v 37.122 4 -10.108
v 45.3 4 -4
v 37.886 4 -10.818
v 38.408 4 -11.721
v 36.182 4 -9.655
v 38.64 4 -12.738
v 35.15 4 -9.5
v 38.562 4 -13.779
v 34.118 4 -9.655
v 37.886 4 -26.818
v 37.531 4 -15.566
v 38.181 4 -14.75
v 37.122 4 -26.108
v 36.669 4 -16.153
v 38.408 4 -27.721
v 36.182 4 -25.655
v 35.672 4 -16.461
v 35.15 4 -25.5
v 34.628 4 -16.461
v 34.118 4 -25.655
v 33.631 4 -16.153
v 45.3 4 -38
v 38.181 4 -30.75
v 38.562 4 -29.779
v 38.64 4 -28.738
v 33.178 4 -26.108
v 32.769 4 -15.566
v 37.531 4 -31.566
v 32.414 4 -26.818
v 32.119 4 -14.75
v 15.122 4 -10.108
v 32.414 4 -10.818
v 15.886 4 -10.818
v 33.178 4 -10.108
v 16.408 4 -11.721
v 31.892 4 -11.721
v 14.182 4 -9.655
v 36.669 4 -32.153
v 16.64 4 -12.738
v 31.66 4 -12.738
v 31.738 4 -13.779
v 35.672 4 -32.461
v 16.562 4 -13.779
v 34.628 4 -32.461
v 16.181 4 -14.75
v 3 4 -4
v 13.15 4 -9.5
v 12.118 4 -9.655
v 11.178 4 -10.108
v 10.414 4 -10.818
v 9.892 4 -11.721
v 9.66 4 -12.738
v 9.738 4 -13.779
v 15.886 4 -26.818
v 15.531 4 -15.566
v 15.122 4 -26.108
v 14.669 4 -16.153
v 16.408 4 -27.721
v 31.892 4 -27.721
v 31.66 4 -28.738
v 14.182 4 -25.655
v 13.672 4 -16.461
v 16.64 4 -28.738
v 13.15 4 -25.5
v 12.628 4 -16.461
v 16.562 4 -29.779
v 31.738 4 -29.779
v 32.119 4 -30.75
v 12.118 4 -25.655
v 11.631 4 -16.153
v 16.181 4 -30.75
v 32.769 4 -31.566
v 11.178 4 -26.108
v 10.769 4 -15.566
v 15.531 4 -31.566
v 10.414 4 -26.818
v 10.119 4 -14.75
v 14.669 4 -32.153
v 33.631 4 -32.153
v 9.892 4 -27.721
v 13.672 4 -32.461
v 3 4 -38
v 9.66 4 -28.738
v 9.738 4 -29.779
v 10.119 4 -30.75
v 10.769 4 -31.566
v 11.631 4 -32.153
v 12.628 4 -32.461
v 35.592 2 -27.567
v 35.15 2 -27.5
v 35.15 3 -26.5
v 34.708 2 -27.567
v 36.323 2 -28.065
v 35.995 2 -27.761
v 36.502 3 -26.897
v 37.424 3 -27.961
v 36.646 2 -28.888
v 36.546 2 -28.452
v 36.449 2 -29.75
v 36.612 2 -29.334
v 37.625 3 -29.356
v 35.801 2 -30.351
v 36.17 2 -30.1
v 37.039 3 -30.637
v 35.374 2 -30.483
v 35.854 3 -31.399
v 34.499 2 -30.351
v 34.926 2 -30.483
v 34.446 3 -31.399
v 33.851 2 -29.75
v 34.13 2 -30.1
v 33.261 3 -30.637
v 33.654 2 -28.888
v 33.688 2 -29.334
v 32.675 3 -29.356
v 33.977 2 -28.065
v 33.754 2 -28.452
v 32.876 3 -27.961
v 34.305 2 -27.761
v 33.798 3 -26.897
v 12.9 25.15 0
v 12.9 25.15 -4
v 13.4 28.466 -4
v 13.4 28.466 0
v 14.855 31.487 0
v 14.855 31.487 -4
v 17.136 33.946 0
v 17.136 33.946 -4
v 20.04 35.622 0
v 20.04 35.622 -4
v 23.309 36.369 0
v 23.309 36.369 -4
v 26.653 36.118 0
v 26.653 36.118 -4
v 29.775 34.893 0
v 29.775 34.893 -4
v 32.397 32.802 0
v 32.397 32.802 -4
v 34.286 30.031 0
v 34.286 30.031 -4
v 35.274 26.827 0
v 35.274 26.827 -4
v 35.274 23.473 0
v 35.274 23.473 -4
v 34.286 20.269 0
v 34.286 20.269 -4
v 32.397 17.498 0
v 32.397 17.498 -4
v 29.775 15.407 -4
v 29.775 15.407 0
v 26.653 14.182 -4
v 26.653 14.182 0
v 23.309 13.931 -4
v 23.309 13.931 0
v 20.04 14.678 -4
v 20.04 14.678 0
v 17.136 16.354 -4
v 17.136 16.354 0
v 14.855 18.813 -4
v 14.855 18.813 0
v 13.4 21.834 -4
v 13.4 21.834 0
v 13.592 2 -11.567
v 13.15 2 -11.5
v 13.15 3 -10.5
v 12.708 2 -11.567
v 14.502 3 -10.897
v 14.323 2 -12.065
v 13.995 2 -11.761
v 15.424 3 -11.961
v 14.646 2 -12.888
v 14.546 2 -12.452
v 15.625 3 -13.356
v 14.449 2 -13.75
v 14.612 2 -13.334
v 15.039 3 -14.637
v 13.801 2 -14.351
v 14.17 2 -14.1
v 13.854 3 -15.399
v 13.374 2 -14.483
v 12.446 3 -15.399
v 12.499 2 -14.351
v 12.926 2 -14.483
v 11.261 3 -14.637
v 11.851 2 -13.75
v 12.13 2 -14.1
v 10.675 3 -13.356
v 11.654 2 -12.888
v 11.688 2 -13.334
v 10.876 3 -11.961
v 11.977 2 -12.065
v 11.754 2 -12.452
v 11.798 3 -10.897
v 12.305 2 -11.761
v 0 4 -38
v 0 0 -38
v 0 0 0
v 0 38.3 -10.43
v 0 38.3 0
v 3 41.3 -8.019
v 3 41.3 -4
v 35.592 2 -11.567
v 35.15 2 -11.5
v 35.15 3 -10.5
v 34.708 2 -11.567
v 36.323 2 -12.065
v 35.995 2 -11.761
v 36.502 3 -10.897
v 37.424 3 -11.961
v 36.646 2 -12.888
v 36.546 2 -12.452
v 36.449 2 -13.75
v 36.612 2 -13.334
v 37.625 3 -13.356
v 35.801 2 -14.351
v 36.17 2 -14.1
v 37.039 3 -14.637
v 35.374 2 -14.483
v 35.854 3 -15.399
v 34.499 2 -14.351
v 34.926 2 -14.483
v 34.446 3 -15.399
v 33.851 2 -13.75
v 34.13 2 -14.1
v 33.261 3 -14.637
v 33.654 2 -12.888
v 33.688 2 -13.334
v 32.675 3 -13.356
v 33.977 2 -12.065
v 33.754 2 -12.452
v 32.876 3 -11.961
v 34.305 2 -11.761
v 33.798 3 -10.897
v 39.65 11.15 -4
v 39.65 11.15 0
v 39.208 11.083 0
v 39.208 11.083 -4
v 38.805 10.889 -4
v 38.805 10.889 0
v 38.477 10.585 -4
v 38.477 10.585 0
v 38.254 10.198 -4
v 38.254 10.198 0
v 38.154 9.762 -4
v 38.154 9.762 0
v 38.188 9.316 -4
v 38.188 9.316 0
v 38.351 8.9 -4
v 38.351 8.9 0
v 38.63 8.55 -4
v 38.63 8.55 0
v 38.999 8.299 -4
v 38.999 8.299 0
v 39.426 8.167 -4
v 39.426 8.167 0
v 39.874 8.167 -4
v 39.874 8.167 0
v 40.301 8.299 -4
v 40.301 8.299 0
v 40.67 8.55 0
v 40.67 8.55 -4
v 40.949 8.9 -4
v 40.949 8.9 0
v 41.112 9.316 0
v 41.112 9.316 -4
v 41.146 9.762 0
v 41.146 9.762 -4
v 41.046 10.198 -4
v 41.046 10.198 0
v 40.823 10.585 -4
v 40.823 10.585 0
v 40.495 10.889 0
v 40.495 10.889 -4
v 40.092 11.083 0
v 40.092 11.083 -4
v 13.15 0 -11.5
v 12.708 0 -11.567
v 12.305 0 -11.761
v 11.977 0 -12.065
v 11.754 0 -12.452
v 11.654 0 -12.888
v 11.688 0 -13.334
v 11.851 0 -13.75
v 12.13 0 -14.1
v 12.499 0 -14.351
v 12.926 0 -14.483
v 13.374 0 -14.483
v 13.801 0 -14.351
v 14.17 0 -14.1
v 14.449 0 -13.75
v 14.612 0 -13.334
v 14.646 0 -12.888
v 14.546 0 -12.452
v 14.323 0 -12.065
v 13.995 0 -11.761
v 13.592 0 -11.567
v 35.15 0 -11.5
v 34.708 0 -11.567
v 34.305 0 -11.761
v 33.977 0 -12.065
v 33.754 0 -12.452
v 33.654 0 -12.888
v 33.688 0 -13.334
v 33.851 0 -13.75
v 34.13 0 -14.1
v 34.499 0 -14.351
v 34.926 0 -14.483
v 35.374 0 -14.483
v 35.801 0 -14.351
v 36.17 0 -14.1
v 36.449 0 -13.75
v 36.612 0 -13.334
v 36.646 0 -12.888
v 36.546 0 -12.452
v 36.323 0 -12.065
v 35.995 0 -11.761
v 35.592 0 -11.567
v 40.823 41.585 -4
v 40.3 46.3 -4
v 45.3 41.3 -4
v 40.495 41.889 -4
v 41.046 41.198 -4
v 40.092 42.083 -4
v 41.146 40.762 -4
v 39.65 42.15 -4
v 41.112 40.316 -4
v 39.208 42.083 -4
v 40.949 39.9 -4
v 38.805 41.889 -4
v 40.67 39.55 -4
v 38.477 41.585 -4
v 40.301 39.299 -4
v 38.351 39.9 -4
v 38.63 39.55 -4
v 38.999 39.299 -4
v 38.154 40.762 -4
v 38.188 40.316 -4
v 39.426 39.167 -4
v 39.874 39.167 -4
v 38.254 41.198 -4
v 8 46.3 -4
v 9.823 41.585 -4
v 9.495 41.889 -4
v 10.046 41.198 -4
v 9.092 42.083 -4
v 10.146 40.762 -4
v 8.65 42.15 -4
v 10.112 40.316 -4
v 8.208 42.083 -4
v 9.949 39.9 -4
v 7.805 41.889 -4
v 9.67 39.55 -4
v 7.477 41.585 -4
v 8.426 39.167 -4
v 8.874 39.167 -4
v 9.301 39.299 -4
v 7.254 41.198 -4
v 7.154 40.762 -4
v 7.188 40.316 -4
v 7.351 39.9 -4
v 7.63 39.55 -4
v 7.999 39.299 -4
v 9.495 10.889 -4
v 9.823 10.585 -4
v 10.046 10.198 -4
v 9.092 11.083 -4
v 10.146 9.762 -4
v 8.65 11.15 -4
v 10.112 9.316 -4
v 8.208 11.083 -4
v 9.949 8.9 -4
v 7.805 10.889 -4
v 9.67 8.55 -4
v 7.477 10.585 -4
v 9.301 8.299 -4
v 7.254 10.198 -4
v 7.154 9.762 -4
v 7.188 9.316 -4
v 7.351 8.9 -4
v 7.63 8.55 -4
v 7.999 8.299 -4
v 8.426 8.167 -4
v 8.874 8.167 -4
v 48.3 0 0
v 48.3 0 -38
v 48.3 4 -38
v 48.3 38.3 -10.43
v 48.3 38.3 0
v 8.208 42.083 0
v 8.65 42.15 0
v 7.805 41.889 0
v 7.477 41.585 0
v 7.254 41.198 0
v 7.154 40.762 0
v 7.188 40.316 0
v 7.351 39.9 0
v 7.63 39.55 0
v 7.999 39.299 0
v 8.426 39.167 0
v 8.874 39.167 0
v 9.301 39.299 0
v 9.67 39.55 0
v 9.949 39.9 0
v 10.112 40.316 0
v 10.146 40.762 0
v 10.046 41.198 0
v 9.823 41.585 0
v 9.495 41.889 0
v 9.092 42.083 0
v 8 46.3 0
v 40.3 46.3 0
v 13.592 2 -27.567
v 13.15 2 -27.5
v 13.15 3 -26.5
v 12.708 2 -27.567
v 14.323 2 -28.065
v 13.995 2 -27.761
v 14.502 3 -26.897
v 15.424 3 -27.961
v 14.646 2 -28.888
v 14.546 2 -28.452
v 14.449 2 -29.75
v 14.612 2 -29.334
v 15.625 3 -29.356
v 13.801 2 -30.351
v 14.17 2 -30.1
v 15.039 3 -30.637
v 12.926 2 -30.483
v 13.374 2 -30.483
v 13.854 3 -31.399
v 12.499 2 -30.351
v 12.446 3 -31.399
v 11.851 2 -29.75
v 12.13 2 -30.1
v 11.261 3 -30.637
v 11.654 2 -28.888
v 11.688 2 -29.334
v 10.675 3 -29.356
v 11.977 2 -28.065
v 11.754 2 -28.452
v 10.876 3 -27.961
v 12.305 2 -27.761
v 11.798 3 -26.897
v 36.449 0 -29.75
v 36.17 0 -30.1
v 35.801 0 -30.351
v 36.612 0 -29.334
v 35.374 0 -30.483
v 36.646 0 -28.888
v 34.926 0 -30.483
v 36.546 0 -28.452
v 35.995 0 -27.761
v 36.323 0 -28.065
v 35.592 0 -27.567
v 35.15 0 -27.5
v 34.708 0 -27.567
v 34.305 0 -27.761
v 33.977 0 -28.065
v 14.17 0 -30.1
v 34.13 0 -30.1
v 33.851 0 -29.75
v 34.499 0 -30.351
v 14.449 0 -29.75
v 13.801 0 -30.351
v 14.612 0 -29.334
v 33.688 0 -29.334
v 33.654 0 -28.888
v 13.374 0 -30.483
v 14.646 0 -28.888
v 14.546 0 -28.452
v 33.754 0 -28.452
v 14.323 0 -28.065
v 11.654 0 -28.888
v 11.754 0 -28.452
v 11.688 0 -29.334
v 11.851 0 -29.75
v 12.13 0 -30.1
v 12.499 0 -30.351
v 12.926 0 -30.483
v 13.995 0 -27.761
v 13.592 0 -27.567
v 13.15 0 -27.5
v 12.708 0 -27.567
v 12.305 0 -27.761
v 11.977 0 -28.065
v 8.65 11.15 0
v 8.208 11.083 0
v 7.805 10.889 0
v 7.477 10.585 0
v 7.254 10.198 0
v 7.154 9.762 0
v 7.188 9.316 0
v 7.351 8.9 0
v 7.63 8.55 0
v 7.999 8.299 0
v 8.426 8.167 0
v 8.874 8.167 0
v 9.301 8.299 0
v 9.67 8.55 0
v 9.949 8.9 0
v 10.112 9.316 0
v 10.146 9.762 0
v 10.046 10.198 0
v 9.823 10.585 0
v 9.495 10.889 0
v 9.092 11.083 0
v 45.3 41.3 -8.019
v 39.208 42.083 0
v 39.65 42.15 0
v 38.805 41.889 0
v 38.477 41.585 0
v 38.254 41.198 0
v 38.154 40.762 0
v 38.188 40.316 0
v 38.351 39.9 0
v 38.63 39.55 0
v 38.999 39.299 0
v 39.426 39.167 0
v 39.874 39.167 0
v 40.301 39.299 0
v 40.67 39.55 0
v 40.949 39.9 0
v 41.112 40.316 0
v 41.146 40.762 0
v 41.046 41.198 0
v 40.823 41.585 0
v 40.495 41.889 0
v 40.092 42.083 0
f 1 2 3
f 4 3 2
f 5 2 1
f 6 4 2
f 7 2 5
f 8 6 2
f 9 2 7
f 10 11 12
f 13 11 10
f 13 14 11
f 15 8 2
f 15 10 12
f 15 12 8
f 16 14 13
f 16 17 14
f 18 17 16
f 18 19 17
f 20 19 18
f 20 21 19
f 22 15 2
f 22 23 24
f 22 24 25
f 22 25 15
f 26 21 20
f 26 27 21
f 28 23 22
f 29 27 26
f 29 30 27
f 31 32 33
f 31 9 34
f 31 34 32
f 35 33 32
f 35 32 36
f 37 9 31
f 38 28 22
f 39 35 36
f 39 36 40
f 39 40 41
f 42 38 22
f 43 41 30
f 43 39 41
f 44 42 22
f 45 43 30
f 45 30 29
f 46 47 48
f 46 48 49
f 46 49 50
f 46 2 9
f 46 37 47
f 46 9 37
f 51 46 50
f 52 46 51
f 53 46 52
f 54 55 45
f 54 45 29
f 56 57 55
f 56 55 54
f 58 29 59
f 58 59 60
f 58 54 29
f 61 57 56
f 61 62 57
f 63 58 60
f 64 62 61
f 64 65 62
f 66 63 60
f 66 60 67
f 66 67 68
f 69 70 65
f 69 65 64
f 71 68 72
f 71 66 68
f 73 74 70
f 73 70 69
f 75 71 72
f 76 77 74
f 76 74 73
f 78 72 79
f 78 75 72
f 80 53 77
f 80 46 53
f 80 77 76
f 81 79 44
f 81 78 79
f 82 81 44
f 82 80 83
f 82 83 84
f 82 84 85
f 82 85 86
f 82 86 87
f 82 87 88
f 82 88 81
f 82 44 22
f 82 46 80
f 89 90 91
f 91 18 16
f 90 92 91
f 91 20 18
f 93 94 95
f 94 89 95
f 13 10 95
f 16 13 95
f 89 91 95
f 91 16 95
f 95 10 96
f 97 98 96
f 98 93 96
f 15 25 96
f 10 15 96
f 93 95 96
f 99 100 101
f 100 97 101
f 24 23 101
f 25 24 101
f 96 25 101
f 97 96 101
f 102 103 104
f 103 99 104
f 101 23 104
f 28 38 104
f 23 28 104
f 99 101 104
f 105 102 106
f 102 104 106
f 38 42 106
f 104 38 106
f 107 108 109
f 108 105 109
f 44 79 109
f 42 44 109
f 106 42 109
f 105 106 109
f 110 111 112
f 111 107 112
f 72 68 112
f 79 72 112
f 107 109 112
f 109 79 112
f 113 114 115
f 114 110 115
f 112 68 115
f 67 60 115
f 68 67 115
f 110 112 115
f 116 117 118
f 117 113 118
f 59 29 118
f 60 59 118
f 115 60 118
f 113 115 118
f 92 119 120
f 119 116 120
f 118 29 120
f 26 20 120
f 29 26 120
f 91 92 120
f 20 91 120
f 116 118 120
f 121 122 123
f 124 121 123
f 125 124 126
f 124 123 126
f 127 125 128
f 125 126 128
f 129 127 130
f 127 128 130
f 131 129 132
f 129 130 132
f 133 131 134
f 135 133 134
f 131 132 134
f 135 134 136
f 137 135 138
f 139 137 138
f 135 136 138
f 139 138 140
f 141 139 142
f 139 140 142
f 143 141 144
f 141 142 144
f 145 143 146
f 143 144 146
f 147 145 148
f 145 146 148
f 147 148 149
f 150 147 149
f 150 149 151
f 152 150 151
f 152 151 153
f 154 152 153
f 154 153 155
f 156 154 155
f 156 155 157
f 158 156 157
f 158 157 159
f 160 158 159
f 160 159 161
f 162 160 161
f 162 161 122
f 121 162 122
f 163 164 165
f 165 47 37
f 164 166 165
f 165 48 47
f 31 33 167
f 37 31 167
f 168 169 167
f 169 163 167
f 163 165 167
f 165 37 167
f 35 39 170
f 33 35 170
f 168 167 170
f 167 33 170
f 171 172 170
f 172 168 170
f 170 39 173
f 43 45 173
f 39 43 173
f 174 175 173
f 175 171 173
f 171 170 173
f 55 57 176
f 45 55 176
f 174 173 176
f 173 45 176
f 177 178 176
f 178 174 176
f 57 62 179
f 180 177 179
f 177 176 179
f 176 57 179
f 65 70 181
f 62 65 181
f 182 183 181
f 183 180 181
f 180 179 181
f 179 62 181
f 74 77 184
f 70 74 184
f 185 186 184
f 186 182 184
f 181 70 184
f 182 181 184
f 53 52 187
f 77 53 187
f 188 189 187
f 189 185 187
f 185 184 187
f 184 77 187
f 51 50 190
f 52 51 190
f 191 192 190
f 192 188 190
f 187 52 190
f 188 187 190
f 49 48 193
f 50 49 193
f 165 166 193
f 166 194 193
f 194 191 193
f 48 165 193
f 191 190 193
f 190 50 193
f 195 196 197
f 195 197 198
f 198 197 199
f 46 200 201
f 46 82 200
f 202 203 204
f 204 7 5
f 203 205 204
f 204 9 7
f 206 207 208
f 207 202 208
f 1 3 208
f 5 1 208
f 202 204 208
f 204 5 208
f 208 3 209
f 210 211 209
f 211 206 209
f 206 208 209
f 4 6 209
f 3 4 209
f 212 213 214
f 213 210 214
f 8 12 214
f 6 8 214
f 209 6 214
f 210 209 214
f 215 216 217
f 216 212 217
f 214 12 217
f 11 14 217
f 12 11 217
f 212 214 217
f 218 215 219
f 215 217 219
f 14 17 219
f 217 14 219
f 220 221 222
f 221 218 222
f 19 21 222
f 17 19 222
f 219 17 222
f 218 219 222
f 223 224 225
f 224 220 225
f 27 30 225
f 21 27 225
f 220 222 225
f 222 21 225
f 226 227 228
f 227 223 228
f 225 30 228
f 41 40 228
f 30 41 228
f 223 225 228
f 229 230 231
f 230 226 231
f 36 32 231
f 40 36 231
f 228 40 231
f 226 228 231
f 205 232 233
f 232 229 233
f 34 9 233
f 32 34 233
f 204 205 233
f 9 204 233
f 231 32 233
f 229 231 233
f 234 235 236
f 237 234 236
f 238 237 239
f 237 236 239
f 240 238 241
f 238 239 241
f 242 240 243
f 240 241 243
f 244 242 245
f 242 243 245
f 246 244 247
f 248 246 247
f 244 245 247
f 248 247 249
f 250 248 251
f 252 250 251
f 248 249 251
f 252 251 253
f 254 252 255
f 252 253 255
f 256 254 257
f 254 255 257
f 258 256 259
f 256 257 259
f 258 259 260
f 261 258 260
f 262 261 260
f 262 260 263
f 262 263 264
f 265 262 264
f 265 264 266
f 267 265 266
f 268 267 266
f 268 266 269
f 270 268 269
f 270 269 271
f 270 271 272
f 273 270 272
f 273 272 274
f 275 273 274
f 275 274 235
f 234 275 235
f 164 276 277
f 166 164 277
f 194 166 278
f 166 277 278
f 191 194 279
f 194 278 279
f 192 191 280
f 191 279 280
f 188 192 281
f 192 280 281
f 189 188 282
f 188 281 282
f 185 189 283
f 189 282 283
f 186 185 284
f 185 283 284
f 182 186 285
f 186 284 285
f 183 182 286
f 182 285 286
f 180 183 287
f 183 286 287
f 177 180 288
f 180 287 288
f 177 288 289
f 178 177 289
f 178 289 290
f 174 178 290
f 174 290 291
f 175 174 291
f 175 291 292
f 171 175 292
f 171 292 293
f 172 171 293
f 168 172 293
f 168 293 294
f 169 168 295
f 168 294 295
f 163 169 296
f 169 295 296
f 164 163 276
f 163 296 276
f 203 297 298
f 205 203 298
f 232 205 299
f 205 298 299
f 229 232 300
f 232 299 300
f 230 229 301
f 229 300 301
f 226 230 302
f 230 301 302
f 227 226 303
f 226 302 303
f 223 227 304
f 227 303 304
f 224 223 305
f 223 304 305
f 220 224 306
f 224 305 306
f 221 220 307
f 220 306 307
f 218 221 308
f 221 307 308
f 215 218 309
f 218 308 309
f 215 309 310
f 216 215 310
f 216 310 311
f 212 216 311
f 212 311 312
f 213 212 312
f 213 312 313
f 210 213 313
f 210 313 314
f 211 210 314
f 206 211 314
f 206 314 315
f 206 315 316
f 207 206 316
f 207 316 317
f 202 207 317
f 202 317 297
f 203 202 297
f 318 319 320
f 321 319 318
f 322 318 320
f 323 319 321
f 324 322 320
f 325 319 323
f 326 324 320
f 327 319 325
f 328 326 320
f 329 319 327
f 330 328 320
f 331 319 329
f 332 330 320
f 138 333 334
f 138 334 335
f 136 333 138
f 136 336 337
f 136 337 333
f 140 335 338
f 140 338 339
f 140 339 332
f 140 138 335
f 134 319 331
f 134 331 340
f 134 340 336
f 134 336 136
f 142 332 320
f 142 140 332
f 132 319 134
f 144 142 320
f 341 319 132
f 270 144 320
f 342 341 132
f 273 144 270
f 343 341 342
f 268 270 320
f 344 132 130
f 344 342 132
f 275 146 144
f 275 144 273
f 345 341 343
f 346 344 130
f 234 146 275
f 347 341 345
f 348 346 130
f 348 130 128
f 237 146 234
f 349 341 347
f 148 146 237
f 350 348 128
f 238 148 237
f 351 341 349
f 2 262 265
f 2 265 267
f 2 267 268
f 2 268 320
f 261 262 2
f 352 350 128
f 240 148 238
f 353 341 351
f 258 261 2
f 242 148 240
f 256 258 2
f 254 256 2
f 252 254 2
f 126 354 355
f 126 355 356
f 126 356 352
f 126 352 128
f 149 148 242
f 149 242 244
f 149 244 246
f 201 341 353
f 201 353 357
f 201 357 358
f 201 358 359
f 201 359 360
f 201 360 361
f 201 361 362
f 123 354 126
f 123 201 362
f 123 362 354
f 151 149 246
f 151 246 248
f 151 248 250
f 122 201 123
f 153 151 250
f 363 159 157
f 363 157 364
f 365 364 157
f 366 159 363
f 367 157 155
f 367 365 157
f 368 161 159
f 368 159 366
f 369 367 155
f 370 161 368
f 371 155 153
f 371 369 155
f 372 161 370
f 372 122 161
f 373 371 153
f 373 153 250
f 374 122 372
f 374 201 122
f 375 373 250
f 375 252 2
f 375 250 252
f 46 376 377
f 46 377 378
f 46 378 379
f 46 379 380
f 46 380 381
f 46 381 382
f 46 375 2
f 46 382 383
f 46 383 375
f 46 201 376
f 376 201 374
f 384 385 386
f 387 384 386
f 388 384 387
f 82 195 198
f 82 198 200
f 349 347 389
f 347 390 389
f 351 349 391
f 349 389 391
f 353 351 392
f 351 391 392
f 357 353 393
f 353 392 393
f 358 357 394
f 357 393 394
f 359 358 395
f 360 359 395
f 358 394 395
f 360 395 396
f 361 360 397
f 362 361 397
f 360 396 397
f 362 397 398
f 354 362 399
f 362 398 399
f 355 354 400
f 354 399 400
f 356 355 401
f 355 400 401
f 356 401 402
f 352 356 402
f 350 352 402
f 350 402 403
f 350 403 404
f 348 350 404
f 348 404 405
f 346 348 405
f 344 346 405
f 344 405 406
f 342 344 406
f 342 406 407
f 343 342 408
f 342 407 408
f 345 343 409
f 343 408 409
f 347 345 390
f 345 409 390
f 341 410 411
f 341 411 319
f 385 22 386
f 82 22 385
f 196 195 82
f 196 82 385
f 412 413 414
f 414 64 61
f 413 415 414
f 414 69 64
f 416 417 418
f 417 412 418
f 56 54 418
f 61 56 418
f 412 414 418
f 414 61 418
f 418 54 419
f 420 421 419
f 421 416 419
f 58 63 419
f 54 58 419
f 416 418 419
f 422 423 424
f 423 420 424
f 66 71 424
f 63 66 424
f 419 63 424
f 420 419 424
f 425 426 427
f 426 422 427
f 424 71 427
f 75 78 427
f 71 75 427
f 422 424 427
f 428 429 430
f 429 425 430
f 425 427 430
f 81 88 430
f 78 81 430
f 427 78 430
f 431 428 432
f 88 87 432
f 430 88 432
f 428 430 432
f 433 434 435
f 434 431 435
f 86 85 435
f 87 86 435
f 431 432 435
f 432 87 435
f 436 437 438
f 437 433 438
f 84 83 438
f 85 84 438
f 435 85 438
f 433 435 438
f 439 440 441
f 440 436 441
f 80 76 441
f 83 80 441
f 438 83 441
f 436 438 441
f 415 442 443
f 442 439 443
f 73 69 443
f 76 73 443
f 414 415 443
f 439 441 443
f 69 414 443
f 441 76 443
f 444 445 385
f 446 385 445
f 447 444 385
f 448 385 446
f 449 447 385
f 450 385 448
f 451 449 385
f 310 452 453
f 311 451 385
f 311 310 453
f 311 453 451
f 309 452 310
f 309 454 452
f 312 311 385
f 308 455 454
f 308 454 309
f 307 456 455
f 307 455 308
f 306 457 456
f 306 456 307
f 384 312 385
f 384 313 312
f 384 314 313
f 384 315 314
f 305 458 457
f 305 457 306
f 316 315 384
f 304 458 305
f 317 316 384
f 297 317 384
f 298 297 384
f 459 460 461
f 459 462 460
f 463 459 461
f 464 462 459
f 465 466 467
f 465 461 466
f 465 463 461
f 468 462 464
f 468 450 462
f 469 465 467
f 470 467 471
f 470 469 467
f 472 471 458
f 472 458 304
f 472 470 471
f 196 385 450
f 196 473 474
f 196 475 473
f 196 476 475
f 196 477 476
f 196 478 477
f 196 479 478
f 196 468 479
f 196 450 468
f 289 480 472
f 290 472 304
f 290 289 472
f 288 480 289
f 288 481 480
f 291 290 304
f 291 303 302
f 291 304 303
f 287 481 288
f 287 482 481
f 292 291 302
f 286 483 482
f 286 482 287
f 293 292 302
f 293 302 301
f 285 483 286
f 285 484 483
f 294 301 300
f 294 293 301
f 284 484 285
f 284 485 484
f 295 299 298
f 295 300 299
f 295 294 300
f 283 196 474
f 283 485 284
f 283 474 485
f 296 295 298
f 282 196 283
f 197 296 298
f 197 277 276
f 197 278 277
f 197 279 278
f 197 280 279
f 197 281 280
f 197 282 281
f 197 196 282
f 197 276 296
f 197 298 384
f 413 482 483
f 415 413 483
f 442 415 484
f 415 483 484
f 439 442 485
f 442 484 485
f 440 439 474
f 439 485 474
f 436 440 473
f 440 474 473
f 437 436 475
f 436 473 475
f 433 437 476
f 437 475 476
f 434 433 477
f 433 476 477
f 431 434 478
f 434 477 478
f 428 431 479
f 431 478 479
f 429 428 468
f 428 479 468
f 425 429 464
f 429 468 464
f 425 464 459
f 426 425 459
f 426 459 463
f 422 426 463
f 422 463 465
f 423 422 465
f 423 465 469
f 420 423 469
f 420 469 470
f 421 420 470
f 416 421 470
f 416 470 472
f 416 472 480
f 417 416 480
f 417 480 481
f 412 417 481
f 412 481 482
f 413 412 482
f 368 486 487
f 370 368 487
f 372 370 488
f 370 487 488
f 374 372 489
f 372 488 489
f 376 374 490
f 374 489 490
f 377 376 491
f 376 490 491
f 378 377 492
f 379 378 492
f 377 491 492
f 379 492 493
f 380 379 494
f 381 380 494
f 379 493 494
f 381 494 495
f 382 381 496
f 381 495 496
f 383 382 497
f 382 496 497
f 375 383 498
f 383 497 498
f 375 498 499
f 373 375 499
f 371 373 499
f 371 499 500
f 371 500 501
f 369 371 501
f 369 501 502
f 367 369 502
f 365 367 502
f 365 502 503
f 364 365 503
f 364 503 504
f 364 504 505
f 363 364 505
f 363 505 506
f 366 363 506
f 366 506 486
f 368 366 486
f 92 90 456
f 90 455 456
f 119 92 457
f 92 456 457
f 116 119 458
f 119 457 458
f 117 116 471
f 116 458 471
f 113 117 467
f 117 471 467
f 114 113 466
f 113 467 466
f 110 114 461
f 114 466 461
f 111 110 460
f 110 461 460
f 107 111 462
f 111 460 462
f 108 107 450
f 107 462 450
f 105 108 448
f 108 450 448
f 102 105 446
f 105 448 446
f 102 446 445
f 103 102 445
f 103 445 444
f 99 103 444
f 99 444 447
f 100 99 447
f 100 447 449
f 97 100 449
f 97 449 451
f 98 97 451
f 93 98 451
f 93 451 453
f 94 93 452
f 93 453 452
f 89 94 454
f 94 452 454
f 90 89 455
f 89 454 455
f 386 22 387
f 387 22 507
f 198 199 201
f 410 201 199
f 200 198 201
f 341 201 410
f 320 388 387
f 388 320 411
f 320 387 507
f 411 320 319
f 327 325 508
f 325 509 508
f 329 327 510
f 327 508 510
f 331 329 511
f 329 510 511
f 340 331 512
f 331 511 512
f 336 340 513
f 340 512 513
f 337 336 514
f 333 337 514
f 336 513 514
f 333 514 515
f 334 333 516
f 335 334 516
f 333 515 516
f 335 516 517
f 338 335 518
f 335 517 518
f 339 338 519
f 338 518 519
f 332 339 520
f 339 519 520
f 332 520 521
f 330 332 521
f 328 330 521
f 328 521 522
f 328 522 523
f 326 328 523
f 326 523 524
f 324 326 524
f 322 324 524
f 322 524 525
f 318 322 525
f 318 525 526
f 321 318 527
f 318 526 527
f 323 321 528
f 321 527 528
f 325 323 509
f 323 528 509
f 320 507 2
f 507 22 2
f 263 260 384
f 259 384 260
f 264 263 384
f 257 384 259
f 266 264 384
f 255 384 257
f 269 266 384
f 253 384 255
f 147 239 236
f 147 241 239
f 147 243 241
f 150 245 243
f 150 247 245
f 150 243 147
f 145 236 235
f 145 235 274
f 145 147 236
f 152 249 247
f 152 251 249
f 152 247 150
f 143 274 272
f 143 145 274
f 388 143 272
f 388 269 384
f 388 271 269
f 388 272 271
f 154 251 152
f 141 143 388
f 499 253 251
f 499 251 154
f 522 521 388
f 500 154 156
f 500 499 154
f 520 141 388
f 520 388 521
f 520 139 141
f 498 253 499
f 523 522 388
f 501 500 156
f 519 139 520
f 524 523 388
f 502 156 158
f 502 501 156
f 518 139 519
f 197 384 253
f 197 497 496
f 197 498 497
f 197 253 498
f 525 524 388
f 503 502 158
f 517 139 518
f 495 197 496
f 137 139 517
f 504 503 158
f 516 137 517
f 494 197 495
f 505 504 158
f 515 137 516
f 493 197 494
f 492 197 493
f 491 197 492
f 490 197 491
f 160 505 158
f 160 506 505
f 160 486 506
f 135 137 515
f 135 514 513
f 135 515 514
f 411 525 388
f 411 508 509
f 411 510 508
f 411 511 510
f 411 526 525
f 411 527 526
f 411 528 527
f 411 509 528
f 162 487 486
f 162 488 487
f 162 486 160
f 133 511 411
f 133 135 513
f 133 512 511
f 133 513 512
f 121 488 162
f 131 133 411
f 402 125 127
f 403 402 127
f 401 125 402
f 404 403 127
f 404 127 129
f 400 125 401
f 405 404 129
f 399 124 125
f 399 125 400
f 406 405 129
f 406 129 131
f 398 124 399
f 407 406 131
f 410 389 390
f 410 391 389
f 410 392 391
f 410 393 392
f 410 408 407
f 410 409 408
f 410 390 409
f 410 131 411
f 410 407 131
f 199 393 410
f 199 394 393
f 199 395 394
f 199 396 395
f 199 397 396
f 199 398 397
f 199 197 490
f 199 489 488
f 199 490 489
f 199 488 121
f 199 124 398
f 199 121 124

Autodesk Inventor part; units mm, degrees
ref_plane "YZ Plane" through (0, 0, 0) normal (1, 0, 0) x (0, 1, 0)
ref_plane "XZ Plane" through (0, 0, 0) normal (0, 1, 0) x (-1, 0, 0)
ref_plane "XY Plane" through (0, 0, 0) normal (0, 0, 1) x (1, 0, 0)
sketch "Szkic5" plane through (0, 0, 0) normal (1, 0, 0) x (0, 1, 0)
  line L0 (0, 0) -> (4, 0)
  line L1 (4, 0) -> (4, -38)
  line L2 (4, -38) -> (0, -38)
  line L3 (0, -38) -> (0, 0)
  line L4 (4, 0) -> (46.3, 0)
  line L5 (46.3, 0) -> (46.3, -4)
  line L6 (46.3, -4) -> (4, -4)
  line L7 (4, -4) -> (4, 0)
  dimension "d10" = 4
  dimension "d11" = 38
  dimension "d12" = 42.3
  dimension "d13" = 4
extrude "Wyciągnięcie proste2" add sketch "Szkic5" along normal blind 48.3
sketch "Szkic6" plane through (0, 4, -4) normal (0, 1, 0) x (1, 0, 0)
  line L0 (48.3, -4) -> (48.3, 34) projected
  line L1 (48.3, 34) -> (45.3, 34)
  line L2 (45.3, 34) -> (45.3, 0)
  line L3 (45.3, 0) -> (48.3, 0)
  line L4 (48.3, 0) -> (48.3, 34)
  line L5 (0, -4) -> (0, 34) projected
  line L6 (0, 34) -> (3, 34)
  line L7 (3, 34) -> (3, 0)
  line L8 (3, 0) -> (0, 0)
  line L9 (0, 0) -> (0, 34)
  dimension "d16" = 3
  dimension "d17" = 34
  dimension "d18" = 3
  dimension "d19" = 34
extrude "Wyciągnięcie proste3" add sketch "Szkic6" along normal blind 42.3
sketch "Szkic7" plane through (0, 0, 0) normal (-1, 0, 0) x (0, 0, 1)
  line L0 (-4, 46.3) -> (-38, 46.3) projected
  line L1 (-4, 46.3) -> (-38, 46.3)
  line L2 (-38, 4) -> (-38, 46.3) projected
  line L3 (-38, 46.3) -> (-38, 4)
  line L4 (-38, 4) -> (-4, 46.3)
  point P0 (0, 0)
extrude "Wyciągnięcie proste4" cut sketch "Szkic7" against normal through all
sketch "Szkic8" plane through (45.3, 4, -4) normal (0, 0, -1) x (-1, 0, 0)
  line L0 (45.3, 42.3) -> (-3, 42.3) projected
  line L1 (-3, 0) -> (-3, 42.3) projected
  line L2 (0, 42.3) -> (0, 0) projected
  circle A0 centre (21.15, 21.15) radius 11.25
  point P0 (45.3, -4)
  dimension "d24" = 21.15
  dimension "d26" = 21.15
  dimension "d27" = 22.5
extrude "Wyciągnięcie proste5" cut sketch "Szkic8" against normal blind 42.3
sketch "Szkic9" plane through (45.3, 4, -4) normal (0, 0, -1) x (-1, 0, 0)
  line L0 (45.3, 42.3) -> (-3, 42.3) projected
  line L1 (21.15, 42.3) -> (21.15, 0) construction
  line L2 (42.3, 0) -> (0, 0) projected
  line L3 (0, 42.3) -> (0, 0) projected
  line L4 (0, 21.15) -> (42.3, 21.15) construction
  line L5 (45.3, 42.3) -> (45.3, -4) projected
  point P0 (5.65, 36.65)
  point P1 (36.65, 36.65)
  point P2 (5.65, 5.65)
  point P3 (36.65, 5.65)
  dimension "d30" = 15.5
  dimension "d31" = 15.5
hole "Otwór1" at (39.65, 40.65, -4) at (8.65, 40.65, -4) at (39.65, 9.65, -4) at (8.65, 9.65, -4) direction (0, 0, 1) diameter 3 depth 8 tip angle 118
sketch "Szkic10" plane through (3, 4, -4) normal (0, 1, 0) x (1, 0, 0)
  line L0 (9.9, 0) -> (32.4, 0) projected
  line L1 (21.15, 0) -> (21.15, 34) construction
  line L2 (0, 34) -> (42.3, 34) projected
  line L3 (42.3, 0) -> (42.3, 34) projected
  line L4 (42.3, 17) -> (0, 17) construction
  line L5 (0, 34) -> (0, 0) projected
  point P0 (-3, -4)
  point P1 (32.15, 9)
  point P2 (10.15, 9)
  point P3 (32.15, 25)
  point P4 (10.15, 25)
  dimension "d39" = 11
  dimension "d40" = 8
hole "Otwór2" at (35.15, 4, -13) at (13.15, 4, -13) at (35.15, 4, -29) at (13.15, 4, -29) direction (0, -1, 0) diameter 3 depth 8 tip angle 118
chamfer "Faza1" distance 2 angle 45 4 edges at (35.15, 4, -14.5) (13.15, 4, -14.5) (35.15, 4, -30.5) (13.15, 4, -30.5)
chamfer "Faza2" distance 8 angle 45 2 edges at (48.3, 46.3, -2) (0, 46.3, -2)
properties part number "Ucwyt_NEMA17"
